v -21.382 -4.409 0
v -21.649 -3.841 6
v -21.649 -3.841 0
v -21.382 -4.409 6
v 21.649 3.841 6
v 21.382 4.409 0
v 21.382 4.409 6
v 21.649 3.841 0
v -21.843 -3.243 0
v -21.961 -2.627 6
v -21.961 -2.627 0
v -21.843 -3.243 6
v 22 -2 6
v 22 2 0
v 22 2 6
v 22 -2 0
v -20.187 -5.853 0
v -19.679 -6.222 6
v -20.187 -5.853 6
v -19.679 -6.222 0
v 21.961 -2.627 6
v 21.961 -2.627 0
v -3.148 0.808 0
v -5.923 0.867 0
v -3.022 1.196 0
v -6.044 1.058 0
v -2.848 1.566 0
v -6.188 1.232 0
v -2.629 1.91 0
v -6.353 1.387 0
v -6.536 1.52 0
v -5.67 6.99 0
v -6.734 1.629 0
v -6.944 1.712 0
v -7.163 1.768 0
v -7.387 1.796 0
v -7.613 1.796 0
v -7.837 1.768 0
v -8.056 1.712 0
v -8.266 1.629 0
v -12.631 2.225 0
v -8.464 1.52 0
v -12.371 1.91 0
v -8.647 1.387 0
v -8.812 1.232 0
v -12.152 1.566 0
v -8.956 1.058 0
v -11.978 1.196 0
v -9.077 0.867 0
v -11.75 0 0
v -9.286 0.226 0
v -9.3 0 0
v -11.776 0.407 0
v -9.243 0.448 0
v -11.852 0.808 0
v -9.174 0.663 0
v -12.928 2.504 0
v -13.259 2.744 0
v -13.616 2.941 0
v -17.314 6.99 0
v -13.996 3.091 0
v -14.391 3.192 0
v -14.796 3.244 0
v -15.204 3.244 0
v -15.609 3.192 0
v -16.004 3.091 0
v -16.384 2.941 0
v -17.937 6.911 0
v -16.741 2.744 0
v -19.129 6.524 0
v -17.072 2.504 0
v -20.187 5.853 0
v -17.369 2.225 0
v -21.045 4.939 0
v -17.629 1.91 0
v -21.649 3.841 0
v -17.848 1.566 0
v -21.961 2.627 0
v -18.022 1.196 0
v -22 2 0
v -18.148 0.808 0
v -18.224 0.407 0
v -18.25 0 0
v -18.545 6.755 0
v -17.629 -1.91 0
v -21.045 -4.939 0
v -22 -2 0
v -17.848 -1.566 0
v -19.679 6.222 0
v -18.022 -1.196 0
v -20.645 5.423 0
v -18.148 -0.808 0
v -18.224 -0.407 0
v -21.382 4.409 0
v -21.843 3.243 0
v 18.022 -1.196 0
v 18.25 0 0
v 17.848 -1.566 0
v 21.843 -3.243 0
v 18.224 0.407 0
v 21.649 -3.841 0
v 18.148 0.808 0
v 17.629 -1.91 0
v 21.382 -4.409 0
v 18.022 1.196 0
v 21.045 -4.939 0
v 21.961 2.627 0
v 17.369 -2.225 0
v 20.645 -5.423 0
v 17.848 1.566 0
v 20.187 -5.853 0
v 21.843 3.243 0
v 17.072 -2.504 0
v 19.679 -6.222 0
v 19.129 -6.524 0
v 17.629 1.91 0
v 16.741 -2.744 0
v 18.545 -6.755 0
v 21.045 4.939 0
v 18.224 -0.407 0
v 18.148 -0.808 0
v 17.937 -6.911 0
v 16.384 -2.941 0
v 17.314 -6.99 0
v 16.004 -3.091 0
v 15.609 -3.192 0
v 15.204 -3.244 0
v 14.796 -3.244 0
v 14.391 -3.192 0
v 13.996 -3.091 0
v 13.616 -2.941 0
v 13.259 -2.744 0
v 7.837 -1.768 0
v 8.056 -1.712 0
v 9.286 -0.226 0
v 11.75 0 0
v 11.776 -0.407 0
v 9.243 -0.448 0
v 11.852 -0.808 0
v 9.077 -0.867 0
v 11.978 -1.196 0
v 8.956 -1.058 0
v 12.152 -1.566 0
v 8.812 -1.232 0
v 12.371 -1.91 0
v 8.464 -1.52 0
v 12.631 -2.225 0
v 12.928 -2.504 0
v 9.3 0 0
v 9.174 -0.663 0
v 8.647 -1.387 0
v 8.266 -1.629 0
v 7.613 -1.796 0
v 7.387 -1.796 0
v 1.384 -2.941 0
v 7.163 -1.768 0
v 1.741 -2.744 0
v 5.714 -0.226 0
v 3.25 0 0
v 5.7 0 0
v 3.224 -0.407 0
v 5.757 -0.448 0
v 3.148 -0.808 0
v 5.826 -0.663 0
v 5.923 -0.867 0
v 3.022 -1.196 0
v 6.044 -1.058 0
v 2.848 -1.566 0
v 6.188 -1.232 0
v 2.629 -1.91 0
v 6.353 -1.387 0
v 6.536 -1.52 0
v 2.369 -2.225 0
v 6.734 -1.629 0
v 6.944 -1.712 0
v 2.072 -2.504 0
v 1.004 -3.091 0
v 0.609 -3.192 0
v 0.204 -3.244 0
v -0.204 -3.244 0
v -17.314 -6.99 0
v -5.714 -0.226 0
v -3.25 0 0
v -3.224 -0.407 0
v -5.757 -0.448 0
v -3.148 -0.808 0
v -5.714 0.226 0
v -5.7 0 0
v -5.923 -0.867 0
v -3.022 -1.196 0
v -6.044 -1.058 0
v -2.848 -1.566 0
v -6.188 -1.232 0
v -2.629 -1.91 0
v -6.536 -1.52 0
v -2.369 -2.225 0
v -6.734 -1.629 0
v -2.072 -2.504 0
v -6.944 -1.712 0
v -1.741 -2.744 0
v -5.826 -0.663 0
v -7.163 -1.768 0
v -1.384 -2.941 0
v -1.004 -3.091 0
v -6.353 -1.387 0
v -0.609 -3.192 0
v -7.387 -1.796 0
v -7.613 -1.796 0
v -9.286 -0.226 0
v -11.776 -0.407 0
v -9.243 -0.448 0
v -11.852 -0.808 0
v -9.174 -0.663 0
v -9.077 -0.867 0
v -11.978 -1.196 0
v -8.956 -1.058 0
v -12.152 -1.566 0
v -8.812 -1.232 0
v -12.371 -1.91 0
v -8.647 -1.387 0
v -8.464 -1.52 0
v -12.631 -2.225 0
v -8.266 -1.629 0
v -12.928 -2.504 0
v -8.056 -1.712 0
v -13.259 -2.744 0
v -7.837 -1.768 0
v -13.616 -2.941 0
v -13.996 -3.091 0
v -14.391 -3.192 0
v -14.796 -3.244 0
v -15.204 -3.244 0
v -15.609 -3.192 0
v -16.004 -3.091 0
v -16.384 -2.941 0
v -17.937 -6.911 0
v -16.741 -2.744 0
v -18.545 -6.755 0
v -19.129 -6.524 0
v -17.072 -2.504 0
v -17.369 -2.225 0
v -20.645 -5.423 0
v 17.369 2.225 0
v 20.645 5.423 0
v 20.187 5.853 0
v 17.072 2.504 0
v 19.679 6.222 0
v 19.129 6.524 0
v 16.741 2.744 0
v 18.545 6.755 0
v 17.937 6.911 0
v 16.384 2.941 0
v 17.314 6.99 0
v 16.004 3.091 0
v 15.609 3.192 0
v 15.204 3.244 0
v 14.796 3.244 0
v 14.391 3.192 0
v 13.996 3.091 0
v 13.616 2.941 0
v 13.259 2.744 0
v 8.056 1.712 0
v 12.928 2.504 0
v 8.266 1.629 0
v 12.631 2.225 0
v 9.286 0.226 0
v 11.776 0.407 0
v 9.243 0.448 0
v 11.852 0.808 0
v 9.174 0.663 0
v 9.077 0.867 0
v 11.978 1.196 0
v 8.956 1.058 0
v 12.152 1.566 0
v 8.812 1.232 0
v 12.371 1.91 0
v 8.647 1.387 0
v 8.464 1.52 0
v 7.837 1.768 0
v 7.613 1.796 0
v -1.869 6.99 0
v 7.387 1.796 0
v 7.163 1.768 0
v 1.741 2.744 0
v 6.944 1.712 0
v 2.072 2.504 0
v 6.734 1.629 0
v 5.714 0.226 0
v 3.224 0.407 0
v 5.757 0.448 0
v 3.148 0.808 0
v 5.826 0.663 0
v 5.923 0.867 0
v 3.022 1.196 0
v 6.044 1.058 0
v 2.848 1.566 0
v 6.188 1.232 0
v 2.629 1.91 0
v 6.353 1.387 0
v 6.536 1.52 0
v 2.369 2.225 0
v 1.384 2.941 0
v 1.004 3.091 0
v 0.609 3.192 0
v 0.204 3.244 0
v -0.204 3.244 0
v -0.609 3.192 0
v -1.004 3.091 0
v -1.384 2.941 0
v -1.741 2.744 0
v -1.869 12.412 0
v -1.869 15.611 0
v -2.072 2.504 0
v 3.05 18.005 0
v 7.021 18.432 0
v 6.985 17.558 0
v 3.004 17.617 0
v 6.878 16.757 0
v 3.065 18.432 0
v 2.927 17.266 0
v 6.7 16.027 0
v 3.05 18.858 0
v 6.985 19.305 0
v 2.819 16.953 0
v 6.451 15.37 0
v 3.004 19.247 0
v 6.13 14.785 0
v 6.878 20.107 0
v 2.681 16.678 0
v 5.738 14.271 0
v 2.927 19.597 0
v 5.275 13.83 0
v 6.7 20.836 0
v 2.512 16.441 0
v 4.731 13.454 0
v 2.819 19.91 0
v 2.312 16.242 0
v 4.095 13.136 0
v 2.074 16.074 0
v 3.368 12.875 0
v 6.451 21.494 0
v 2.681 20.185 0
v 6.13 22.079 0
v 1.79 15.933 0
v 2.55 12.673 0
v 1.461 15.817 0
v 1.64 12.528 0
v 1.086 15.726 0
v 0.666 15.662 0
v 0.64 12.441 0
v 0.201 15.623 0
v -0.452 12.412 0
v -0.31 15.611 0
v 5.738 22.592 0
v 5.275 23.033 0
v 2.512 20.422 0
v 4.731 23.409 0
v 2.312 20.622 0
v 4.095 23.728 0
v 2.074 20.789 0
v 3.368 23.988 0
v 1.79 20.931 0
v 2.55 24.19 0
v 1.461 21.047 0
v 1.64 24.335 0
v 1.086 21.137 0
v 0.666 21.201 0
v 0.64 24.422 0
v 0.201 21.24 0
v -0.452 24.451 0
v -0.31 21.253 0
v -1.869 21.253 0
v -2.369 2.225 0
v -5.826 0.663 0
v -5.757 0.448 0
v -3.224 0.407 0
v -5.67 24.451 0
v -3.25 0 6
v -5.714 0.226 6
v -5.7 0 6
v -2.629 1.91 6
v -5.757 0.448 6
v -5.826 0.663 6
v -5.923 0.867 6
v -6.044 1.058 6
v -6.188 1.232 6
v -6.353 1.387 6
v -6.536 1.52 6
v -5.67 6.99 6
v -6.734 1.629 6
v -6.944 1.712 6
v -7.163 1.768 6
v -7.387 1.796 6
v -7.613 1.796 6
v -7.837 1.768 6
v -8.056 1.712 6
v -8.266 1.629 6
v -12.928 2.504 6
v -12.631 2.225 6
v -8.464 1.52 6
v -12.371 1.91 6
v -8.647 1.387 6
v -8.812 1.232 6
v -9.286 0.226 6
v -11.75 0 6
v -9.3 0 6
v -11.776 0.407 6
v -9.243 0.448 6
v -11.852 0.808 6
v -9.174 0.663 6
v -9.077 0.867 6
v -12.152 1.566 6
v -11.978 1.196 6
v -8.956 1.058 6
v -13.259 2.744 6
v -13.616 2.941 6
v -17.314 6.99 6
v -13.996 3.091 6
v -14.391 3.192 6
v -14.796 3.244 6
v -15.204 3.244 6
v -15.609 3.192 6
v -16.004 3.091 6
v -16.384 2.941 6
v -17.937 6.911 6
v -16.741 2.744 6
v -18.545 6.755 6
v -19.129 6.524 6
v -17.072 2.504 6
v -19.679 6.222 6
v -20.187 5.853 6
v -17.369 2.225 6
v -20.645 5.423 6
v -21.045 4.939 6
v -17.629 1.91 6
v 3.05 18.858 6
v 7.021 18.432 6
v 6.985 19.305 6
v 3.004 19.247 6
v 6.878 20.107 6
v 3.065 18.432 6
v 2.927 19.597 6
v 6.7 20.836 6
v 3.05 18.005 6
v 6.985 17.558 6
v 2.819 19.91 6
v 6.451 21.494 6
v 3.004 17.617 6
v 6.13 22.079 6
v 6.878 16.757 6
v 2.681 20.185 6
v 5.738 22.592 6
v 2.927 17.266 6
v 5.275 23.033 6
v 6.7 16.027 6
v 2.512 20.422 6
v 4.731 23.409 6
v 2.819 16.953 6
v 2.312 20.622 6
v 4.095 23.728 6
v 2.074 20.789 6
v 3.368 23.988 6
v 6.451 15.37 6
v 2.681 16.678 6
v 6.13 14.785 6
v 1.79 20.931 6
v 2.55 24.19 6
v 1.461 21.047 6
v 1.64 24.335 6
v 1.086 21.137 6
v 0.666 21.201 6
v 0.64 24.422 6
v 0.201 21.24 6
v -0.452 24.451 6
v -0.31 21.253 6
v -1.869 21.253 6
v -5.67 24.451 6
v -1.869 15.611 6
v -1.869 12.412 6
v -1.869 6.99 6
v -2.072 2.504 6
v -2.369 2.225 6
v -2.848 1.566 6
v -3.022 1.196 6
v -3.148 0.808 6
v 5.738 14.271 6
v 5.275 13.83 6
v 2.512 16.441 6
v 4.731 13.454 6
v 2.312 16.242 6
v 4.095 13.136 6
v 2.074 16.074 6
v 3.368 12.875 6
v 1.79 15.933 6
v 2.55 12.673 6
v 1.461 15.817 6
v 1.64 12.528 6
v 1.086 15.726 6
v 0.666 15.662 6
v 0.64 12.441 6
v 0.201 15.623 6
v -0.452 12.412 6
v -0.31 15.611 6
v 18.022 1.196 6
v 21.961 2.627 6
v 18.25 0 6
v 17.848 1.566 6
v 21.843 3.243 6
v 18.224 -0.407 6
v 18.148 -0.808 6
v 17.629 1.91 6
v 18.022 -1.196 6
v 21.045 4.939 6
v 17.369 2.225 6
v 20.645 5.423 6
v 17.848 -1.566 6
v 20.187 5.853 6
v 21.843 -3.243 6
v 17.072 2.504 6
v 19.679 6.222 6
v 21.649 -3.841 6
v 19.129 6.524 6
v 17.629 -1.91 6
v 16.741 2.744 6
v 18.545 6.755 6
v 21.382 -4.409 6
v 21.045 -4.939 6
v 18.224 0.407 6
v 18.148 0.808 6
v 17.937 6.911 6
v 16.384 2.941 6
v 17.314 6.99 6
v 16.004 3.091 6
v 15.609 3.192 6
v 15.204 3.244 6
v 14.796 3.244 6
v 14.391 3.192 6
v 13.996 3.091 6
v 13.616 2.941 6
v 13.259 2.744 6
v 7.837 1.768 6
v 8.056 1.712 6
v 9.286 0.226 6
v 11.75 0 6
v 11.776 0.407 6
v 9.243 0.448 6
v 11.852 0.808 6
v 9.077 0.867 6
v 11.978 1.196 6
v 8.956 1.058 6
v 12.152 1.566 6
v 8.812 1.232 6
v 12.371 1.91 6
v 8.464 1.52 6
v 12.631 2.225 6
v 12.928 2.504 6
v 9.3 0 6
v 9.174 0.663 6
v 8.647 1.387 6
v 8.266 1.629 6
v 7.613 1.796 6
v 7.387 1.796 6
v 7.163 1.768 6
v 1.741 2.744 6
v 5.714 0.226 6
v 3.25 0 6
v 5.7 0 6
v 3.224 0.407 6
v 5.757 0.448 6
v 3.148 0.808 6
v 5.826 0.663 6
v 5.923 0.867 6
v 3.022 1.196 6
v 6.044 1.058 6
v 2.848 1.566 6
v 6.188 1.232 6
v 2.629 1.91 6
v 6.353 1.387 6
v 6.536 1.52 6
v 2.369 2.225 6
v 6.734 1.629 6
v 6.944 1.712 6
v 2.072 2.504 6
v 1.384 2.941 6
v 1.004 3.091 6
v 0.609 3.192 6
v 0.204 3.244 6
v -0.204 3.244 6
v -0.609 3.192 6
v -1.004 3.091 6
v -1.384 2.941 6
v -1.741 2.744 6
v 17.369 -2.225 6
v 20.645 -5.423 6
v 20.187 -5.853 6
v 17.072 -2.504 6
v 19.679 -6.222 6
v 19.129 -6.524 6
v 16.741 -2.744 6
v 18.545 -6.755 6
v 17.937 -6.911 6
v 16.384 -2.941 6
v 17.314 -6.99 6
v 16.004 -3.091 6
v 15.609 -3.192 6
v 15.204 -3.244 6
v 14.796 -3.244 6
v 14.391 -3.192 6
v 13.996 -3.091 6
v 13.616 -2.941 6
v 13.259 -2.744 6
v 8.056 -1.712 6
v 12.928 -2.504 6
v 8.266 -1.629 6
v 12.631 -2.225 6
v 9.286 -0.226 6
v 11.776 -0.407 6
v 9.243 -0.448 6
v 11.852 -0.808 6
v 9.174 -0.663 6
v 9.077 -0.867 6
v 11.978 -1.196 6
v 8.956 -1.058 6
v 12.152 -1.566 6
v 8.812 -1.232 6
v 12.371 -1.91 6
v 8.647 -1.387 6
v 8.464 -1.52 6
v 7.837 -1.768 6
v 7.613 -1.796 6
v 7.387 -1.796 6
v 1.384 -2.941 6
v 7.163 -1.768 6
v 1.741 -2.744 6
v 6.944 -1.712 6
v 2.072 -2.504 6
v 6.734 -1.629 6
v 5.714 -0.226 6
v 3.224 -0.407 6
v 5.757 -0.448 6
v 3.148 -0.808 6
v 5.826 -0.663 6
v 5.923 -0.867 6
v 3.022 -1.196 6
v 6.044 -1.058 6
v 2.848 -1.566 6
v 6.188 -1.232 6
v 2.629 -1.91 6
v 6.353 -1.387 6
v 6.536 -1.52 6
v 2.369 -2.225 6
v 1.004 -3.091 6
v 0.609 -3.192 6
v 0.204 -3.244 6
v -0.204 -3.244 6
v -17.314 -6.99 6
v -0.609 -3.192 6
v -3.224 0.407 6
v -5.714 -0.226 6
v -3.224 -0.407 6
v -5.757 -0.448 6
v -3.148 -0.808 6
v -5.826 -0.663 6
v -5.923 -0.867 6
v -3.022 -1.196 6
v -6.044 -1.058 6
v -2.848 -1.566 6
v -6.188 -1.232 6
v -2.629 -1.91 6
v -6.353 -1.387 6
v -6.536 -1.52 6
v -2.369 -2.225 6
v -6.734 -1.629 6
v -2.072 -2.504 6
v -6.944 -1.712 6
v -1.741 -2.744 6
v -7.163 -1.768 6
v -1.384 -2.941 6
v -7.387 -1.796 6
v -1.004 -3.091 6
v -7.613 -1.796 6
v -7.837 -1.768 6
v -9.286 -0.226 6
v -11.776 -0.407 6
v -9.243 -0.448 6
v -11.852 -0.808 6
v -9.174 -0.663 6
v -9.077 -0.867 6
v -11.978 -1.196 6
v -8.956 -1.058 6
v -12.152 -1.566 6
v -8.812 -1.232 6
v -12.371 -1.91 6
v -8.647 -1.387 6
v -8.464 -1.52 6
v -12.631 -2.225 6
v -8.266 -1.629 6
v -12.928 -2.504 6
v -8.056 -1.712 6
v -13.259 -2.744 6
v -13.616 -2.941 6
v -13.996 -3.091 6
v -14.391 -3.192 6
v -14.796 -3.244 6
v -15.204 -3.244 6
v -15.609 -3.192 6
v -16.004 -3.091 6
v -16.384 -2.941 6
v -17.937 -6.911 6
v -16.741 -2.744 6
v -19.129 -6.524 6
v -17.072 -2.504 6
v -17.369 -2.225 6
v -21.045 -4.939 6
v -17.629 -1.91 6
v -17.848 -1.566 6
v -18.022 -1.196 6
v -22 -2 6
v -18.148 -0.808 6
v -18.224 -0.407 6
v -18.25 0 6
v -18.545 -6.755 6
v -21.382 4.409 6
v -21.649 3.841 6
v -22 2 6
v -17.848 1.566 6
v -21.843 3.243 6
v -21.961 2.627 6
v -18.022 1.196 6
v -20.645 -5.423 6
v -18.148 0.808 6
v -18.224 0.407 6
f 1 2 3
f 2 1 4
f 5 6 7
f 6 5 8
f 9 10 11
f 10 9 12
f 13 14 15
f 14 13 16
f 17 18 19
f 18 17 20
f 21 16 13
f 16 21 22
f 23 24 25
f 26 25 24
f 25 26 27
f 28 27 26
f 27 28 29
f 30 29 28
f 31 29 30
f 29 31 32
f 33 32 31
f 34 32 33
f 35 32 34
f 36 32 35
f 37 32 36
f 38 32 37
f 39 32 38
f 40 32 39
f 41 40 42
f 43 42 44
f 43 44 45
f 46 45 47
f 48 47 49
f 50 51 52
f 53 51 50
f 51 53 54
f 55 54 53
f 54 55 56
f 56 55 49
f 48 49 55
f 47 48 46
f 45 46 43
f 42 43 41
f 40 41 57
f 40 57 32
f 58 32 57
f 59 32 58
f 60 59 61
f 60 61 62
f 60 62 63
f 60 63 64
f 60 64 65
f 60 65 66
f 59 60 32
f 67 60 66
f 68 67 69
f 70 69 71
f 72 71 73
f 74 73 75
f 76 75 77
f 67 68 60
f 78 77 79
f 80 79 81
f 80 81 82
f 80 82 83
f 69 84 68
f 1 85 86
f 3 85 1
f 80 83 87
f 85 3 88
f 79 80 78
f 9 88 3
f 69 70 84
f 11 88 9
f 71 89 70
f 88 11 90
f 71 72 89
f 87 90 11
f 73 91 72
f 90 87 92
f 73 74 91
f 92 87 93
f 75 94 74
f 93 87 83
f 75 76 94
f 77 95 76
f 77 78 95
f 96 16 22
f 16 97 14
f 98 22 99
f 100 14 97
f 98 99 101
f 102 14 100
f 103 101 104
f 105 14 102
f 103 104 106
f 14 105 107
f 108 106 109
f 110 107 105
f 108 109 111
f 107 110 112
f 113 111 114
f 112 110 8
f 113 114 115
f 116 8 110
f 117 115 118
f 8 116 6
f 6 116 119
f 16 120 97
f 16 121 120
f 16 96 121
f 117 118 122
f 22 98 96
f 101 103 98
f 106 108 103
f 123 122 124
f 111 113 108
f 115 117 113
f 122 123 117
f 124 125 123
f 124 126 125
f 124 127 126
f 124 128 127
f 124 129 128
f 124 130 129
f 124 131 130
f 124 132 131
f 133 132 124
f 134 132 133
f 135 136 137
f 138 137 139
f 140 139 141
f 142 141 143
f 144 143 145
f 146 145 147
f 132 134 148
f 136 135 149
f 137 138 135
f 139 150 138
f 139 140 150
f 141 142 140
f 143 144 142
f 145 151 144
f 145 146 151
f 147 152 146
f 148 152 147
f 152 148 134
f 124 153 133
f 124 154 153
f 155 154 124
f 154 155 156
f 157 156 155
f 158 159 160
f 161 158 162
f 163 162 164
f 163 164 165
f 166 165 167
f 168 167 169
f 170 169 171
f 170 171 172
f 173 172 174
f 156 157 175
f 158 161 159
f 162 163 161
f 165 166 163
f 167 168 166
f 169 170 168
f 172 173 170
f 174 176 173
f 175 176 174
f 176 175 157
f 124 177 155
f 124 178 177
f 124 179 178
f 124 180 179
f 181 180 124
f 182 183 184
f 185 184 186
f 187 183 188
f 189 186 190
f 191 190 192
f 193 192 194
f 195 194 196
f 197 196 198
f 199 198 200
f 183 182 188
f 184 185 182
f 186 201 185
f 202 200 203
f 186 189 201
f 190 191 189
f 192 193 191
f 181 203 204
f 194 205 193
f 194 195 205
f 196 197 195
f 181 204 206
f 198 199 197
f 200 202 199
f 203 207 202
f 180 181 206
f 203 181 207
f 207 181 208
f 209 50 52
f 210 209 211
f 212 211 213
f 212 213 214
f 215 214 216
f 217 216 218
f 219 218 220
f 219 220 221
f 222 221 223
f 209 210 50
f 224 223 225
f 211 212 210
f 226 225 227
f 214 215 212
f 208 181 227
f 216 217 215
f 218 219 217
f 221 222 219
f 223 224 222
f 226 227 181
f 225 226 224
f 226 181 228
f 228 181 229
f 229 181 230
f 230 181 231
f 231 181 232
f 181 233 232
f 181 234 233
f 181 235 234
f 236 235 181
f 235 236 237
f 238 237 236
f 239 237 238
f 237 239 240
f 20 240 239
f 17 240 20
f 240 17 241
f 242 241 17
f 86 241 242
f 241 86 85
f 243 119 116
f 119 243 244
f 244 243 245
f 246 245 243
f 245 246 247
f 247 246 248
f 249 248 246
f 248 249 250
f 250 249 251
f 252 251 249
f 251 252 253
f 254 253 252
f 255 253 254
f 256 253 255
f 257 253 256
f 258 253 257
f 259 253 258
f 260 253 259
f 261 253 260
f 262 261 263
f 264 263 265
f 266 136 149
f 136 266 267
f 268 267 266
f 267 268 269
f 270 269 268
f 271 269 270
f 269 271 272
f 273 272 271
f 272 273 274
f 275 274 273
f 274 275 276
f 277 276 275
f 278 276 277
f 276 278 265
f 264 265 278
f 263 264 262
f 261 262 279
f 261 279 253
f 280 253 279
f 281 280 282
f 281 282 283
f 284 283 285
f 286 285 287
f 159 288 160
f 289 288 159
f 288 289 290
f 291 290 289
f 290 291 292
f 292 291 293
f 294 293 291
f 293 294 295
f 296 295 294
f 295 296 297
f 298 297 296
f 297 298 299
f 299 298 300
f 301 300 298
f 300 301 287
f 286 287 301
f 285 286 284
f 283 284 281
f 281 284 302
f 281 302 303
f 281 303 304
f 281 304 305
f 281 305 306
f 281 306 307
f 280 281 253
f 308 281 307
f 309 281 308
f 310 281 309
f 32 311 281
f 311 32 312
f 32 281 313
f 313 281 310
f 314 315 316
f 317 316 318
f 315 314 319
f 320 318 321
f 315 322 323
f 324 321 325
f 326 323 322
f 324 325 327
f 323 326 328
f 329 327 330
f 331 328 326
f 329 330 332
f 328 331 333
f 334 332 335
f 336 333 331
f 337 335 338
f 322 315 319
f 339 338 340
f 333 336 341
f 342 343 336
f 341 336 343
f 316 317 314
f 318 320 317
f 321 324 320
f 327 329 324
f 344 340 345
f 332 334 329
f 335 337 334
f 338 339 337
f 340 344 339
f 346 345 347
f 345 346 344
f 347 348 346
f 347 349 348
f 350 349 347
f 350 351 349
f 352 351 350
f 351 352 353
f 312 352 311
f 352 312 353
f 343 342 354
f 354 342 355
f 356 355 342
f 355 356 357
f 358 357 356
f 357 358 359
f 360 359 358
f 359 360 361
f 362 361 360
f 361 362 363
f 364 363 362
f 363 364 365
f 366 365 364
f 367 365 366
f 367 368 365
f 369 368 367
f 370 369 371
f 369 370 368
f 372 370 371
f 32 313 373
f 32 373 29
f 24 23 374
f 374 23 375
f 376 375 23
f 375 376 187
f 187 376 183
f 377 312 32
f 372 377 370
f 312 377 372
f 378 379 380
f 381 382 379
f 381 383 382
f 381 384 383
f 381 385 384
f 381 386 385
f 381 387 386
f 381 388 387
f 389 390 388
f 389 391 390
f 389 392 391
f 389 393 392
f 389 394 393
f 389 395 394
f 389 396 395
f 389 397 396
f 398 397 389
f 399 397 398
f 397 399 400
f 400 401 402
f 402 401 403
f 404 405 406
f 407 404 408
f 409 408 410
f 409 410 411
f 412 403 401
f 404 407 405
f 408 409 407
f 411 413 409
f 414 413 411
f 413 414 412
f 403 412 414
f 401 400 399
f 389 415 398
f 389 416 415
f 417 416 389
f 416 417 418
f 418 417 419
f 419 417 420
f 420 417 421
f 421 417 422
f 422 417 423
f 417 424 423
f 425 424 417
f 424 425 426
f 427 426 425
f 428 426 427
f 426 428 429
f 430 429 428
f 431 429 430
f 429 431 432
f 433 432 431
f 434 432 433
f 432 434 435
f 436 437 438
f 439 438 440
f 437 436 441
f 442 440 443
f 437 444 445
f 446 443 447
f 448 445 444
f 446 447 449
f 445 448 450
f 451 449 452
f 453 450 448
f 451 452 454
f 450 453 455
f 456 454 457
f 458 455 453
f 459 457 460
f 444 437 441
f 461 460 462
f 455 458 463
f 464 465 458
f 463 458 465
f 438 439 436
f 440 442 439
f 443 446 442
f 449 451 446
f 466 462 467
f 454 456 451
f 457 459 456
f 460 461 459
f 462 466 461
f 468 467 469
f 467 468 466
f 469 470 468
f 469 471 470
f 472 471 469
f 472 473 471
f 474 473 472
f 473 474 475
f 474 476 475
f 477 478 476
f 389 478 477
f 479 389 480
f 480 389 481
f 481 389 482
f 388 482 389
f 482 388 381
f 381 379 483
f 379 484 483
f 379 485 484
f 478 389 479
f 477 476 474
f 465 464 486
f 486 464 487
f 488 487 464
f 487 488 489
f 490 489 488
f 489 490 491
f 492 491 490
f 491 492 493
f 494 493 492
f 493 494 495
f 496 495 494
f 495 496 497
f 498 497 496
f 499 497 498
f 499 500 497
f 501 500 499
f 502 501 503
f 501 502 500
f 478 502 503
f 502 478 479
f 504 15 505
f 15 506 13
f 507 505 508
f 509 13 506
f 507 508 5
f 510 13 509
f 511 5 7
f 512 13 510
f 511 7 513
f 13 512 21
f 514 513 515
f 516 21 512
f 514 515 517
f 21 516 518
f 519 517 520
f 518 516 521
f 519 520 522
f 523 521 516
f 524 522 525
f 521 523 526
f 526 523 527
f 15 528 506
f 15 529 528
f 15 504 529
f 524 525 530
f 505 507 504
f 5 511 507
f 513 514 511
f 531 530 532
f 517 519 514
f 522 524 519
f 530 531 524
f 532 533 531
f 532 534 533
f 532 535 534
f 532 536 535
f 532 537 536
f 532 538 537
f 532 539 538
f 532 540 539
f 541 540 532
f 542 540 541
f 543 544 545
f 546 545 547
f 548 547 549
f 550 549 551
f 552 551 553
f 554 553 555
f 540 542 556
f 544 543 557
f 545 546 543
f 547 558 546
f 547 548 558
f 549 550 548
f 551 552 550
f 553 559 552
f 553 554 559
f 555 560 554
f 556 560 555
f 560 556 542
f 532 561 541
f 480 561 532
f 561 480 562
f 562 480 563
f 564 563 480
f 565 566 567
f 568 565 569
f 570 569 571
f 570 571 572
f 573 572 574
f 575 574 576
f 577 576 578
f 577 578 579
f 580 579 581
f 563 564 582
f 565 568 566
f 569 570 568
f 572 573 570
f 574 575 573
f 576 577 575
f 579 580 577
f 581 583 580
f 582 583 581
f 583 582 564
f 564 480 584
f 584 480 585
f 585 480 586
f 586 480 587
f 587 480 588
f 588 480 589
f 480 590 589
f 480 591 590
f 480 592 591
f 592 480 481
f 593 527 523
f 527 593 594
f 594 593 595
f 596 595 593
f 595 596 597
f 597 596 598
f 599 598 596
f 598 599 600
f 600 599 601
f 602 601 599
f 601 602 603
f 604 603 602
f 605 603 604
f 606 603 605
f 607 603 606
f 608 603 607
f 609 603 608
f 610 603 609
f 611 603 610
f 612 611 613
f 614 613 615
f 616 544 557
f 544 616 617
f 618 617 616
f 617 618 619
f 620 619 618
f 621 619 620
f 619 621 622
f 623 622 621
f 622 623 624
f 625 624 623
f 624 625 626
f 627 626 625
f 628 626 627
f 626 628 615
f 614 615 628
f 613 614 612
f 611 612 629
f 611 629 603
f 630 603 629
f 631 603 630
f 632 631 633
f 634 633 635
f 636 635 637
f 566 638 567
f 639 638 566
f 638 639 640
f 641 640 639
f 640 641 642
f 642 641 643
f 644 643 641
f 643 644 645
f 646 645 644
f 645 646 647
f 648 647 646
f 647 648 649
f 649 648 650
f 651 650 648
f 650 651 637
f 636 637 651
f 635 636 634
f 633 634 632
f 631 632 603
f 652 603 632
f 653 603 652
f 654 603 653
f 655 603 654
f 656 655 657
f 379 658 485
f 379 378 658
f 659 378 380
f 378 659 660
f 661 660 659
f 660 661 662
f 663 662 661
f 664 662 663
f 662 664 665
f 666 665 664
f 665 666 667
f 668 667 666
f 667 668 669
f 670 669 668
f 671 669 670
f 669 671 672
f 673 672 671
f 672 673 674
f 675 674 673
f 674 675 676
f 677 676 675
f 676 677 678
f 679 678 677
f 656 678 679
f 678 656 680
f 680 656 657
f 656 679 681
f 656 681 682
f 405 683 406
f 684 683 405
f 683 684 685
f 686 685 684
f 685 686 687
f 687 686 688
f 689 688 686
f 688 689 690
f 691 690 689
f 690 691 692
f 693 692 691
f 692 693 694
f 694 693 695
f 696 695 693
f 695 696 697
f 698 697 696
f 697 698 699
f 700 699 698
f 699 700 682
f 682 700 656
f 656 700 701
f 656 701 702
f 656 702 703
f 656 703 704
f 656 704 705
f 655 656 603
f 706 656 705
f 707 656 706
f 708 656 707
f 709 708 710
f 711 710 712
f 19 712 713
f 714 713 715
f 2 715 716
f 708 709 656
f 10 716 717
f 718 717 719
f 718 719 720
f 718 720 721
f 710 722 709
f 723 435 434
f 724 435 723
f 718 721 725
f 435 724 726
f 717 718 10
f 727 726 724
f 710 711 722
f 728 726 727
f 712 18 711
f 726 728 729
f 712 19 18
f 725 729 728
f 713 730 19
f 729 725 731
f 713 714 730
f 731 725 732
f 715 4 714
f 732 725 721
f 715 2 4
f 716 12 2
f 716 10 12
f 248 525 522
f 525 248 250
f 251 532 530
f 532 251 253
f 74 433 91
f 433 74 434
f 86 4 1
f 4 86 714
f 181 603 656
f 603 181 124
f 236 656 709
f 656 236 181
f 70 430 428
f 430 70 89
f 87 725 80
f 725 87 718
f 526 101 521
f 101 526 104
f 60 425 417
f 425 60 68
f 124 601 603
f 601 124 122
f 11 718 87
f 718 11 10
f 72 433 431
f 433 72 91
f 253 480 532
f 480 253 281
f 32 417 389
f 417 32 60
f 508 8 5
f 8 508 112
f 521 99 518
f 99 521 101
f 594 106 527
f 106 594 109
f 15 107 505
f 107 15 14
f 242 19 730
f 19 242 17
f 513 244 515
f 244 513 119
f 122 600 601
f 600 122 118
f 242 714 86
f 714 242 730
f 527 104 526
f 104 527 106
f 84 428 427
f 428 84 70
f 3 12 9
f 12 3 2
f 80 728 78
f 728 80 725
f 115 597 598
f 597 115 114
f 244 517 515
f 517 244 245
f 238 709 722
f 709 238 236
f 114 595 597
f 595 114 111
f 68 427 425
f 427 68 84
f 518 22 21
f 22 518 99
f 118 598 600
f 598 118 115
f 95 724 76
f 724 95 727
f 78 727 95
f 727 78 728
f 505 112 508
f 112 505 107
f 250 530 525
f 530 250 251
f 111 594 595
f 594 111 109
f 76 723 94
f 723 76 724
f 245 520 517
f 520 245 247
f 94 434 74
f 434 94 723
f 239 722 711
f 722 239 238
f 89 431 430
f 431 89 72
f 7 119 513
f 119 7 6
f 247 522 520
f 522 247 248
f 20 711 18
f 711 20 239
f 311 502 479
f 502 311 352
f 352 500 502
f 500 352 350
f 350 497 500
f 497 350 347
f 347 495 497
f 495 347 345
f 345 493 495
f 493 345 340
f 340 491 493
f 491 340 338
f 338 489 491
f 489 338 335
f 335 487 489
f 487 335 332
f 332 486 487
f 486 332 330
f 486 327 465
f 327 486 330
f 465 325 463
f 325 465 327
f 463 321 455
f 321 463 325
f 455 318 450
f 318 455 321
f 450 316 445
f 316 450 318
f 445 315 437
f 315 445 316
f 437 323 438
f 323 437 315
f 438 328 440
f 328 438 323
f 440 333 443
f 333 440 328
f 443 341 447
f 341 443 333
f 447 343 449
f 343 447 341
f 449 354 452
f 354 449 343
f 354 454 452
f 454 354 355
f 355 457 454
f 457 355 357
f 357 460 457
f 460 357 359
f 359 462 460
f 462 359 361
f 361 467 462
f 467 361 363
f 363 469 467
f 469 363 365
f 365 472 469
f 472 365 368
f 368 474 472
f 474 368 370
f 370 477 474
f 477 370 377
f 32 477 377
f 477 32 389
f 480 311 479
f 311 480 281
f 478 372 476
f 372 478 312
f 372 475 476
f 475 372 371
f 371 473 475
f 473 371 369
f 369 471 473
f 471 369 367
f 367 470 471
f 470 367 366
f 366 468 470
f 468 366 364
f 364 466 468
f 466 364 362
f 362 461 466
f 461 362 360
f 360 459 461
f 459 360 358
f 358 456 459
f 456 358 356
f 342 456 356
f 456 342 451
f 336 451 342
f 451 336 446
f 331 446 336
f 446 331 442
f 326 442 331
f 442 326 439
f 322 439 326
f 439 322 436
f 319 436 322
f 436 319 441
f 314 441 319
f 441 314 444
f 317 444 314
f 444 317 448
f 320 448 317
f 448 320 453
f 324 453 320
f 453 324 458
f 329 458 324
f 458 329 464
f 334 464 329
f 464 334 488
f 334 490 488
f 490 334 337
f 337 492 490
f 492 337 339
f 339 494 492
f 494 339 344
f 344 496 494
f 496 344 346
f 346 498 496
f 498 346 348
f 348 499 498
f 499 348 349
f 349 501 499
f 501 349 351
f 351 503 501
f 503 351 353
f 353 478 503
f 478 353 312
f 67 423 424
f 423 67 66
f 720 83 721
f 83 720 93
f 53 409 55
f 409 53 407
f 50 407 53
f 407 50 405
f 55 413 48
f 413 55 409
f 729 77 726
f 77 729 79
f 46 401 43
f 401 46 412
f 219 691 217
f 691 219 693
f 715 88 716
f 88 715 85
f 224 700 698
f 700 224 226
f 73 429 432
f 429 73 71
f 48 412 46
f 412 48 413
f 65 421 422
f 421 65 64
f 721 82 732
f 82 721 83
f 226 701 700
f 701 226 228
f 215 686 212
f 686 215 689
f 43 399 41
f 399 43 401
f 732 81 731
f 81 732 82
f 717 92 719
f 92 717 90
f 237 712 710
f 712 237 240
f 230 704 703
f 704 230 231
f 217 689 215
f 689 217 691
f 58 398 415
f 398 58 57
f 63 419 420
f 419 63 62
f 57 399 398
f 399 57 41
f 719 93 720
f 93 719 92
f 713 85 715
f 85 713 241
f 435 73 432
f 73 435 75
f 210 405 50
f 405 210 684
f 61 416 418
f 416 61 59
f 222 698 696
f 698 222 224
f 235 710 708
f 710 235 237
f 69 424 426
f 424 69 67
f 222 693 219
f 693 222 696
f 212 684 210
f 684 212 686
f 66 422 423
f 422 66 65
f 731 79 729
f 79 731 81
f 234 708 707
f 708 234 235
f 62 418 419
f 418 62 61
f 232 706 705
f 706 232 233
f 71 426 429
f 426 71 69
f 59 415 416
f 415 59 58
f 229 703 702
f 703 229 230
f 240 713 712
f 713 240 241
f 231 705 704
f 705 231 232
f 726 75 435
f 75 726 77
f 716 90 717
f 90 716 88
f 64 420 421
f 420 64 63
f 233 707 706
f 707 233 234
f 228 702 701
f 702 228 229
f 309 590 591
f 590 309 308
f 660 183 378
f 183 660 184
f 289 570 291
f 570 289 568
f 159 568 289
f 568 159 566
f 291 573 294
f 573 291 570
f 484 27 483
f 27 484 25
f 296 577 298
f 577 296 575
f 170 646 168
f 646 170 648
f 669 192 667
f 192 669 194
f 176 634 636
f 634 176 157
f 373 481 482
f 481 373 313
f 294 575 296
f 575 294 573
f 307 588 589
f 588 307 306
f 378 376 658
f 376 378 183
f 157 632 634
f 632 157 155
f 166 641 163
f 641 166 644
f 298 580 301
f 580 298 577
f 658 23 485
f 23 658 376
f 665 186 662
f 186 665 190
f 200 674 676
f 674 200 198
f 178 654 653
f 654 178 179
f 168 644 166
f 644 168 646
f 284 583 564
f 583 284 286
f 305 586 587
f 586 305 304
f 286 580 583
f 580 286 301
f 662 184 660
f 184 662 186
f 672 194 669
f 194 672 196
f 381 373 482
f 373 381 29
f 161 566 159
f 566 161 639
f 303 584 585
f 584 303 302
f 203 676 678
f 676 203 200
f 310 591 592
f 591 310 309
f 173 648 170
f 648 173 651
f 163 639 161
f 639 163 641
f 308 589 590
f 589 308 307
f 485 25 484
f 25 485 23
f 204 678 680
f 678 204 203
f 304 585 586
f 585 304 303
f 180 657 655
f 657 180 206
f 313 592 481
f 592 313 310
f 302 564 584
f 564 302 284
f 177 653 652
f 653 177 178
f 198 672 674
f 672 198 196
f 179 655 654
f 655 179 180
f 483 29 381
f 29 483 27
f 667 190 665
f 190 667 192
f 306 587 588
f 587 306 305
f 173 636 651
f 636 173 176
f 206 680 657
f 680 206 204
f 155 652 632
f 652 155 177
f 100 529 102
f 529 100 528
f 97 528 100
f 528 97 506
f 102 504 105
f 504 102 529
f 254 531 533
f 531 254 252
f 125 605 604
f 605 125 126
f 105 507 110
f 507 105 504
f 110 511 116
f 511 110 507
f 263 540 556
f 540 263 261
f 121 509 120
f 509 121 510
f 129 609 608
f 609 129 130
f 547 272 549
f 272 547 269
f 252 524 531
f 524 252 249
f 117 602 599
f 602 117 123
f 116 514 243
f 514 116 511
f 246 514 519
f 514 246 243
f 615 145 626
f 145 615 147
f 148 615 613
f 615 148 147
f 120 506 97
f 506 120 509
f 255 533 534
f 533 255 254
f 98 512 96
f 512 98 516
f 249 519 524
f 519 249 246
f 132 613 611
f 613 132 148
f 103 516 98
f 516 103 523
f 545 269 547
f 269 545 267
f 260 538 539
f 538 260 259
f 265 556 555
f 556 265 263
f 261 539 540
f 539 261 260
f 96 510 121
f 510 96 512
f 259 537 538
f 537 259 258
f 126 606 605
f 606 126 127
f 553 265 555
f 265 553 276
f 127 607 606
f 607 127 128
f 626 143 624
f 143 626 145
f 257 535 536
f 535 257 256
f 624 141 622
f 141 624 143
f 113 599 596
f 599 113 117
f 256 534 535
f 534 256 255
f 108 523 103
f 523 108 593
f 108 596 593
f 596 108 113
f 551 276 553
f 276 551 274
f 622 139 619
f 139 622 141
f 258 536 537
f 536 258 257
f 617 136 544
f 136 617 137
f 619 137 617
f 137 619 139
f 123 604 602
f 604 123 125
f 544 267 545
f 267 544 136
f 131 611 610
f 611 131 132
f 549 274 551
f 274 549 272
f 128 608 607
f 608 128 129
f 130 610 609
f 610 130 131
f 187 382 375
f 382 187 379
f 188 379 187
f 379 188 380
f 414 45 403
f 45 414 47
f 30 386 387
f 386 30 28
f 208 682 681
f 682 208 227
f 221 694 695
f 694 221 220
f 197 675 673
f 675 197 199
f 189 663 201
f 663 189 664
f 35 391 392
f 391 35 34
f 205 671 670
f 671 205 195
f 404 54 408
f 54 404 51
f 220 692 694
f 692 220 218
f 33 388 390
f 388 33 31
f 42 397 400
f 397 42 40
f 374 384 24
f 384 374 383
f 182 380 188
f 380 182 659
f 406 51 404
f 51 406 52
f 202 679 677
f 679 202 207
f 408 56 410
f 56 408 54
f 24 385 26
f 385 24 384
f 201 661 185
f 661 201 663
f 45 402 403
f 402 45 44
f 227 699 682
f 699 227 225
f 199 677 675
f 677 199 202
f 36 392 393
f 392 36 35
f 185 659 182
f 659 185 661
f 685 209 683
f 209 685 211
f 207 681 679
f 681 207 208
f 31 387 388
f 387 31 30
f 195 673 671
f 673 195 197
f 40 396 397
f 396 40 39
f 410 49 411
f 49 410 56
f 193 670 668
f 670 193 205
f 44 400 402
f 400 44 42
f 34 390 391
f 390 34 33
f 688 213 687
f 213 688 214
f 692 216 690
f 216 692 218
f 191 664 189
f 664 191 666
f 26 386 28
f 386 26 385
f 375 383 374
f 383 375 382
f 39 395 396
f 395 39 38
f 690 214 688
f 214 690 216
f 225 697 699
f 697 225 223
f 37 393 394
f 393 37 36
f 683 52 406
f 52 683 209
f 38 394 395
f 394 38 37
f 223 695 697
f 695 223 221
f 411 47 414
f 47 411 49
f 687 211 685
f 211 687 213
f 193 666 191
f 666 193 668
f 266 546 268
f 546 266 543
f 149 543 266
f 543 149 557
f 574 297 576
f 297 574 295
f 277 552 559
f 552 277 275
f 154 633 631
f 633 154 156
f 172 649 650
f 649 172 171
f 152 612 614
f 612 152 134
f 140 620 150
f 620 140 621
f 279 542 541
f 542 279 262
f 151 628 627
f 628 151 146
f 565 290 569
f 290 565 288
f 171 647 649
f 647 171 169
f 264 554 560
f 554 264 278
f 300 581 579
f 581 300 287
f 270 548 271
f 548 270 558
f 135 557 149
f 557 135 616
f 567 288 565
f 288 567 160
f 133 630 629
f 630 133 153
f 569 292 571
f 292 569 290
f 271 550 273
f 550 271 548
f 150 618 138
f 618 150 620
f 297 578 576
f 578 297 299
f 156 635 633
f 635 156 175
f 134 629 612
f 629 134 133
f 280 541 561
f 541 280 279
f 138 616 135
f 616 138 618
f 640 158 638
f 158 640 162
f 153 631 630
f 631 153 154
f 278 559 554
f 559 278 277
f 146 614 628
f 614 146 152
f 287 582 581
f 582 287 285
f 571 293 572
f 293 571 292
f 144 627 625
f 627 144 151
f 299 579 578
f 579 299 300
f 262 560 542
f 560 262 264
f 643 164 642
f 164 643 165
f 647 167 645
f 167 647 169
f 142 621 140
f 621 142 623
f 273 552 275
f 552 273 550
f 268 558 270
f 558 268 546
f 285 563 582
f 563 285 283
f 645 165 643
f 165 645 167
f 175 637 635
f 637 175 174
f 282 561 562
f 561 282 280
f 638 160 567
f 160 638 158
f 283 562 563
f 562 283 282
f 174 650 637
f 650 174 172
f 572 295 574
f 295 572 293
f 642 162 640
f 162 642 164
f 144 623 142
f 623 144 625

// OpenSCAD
$fn = 50;


difference() {
	union() {
		hull() {
			translate(v = [-17.0000000000, 2.0000000000, 0]) {
				cylinder(h = 6, r = 5);
			}
			translate(v = [17.0000000000, 2.0000000000, 0]) {
				cylinder(h = 6, r = 5);
			}
			translate(v = [-17.0000000000, -2.0000000000, 0]) {
				cylinder(h = 6, r = 5);
			}
			translate(v = [17.0000000000, -2.0000000000, 0]) {
				cylinder(h = 6, r = 5);
			}
		}
		translate(v = [0, 24, 0]) {
			linear_extrude(height = 6) {
				text(font = "DejaVu Sans Mono:style=Bold", halign = "center", size = 19.0000000000, text = "P", valign = "top");
			}
		}
	}
	union() {
		translate(v = [-15.0000000000, 0.0000000000, 0]) {
			translate(v = [0, 0, -100]) {
				cylinder(h = 200, r = 3.2500000000);
			}
		}
		translate(v = [0, 0, -100]) {
			cylinder(h = 200, r = 3.2500000000);
		}
		translate(v = [15.0000000000, 0.0000000000, 0]) {
			translate(v = [0, 0, -100]) {
				cylinder(h = 200, r = 3.2500000000);
			}
		}
		translate(v = [-15.0000000000, 0.0000000000, 0]) {
			translate(v = [0, 0, -100]) {
				cylinder(h = 200, r = 1.8000000000);
			}
		}
		translate(v = [-7.5000000000, 0.0000000000, 0]) {
			translate(v = [0, 0, -100]) {
				cylinder(h = 200, r = 1.8000000000);
			}
		}
		translate(v = [0, 0, -100]) {
			cylinder(h = 200, r = 1.8000000000);
		}
		translate(v = [7.5000000000, 0.0000000000, 0]) {
			translate(v = [0, 0, -100]) {
				cylinder(h = 200, r = 1.8000000000);
			}
		}
		translate(v = [15.0000000000, 0.0000000000, 0]) {
			translate(v = [0, 0, -100]) {
				cylinder(h = 200, r = 1.8000000000);
			}
		}
	}
}
